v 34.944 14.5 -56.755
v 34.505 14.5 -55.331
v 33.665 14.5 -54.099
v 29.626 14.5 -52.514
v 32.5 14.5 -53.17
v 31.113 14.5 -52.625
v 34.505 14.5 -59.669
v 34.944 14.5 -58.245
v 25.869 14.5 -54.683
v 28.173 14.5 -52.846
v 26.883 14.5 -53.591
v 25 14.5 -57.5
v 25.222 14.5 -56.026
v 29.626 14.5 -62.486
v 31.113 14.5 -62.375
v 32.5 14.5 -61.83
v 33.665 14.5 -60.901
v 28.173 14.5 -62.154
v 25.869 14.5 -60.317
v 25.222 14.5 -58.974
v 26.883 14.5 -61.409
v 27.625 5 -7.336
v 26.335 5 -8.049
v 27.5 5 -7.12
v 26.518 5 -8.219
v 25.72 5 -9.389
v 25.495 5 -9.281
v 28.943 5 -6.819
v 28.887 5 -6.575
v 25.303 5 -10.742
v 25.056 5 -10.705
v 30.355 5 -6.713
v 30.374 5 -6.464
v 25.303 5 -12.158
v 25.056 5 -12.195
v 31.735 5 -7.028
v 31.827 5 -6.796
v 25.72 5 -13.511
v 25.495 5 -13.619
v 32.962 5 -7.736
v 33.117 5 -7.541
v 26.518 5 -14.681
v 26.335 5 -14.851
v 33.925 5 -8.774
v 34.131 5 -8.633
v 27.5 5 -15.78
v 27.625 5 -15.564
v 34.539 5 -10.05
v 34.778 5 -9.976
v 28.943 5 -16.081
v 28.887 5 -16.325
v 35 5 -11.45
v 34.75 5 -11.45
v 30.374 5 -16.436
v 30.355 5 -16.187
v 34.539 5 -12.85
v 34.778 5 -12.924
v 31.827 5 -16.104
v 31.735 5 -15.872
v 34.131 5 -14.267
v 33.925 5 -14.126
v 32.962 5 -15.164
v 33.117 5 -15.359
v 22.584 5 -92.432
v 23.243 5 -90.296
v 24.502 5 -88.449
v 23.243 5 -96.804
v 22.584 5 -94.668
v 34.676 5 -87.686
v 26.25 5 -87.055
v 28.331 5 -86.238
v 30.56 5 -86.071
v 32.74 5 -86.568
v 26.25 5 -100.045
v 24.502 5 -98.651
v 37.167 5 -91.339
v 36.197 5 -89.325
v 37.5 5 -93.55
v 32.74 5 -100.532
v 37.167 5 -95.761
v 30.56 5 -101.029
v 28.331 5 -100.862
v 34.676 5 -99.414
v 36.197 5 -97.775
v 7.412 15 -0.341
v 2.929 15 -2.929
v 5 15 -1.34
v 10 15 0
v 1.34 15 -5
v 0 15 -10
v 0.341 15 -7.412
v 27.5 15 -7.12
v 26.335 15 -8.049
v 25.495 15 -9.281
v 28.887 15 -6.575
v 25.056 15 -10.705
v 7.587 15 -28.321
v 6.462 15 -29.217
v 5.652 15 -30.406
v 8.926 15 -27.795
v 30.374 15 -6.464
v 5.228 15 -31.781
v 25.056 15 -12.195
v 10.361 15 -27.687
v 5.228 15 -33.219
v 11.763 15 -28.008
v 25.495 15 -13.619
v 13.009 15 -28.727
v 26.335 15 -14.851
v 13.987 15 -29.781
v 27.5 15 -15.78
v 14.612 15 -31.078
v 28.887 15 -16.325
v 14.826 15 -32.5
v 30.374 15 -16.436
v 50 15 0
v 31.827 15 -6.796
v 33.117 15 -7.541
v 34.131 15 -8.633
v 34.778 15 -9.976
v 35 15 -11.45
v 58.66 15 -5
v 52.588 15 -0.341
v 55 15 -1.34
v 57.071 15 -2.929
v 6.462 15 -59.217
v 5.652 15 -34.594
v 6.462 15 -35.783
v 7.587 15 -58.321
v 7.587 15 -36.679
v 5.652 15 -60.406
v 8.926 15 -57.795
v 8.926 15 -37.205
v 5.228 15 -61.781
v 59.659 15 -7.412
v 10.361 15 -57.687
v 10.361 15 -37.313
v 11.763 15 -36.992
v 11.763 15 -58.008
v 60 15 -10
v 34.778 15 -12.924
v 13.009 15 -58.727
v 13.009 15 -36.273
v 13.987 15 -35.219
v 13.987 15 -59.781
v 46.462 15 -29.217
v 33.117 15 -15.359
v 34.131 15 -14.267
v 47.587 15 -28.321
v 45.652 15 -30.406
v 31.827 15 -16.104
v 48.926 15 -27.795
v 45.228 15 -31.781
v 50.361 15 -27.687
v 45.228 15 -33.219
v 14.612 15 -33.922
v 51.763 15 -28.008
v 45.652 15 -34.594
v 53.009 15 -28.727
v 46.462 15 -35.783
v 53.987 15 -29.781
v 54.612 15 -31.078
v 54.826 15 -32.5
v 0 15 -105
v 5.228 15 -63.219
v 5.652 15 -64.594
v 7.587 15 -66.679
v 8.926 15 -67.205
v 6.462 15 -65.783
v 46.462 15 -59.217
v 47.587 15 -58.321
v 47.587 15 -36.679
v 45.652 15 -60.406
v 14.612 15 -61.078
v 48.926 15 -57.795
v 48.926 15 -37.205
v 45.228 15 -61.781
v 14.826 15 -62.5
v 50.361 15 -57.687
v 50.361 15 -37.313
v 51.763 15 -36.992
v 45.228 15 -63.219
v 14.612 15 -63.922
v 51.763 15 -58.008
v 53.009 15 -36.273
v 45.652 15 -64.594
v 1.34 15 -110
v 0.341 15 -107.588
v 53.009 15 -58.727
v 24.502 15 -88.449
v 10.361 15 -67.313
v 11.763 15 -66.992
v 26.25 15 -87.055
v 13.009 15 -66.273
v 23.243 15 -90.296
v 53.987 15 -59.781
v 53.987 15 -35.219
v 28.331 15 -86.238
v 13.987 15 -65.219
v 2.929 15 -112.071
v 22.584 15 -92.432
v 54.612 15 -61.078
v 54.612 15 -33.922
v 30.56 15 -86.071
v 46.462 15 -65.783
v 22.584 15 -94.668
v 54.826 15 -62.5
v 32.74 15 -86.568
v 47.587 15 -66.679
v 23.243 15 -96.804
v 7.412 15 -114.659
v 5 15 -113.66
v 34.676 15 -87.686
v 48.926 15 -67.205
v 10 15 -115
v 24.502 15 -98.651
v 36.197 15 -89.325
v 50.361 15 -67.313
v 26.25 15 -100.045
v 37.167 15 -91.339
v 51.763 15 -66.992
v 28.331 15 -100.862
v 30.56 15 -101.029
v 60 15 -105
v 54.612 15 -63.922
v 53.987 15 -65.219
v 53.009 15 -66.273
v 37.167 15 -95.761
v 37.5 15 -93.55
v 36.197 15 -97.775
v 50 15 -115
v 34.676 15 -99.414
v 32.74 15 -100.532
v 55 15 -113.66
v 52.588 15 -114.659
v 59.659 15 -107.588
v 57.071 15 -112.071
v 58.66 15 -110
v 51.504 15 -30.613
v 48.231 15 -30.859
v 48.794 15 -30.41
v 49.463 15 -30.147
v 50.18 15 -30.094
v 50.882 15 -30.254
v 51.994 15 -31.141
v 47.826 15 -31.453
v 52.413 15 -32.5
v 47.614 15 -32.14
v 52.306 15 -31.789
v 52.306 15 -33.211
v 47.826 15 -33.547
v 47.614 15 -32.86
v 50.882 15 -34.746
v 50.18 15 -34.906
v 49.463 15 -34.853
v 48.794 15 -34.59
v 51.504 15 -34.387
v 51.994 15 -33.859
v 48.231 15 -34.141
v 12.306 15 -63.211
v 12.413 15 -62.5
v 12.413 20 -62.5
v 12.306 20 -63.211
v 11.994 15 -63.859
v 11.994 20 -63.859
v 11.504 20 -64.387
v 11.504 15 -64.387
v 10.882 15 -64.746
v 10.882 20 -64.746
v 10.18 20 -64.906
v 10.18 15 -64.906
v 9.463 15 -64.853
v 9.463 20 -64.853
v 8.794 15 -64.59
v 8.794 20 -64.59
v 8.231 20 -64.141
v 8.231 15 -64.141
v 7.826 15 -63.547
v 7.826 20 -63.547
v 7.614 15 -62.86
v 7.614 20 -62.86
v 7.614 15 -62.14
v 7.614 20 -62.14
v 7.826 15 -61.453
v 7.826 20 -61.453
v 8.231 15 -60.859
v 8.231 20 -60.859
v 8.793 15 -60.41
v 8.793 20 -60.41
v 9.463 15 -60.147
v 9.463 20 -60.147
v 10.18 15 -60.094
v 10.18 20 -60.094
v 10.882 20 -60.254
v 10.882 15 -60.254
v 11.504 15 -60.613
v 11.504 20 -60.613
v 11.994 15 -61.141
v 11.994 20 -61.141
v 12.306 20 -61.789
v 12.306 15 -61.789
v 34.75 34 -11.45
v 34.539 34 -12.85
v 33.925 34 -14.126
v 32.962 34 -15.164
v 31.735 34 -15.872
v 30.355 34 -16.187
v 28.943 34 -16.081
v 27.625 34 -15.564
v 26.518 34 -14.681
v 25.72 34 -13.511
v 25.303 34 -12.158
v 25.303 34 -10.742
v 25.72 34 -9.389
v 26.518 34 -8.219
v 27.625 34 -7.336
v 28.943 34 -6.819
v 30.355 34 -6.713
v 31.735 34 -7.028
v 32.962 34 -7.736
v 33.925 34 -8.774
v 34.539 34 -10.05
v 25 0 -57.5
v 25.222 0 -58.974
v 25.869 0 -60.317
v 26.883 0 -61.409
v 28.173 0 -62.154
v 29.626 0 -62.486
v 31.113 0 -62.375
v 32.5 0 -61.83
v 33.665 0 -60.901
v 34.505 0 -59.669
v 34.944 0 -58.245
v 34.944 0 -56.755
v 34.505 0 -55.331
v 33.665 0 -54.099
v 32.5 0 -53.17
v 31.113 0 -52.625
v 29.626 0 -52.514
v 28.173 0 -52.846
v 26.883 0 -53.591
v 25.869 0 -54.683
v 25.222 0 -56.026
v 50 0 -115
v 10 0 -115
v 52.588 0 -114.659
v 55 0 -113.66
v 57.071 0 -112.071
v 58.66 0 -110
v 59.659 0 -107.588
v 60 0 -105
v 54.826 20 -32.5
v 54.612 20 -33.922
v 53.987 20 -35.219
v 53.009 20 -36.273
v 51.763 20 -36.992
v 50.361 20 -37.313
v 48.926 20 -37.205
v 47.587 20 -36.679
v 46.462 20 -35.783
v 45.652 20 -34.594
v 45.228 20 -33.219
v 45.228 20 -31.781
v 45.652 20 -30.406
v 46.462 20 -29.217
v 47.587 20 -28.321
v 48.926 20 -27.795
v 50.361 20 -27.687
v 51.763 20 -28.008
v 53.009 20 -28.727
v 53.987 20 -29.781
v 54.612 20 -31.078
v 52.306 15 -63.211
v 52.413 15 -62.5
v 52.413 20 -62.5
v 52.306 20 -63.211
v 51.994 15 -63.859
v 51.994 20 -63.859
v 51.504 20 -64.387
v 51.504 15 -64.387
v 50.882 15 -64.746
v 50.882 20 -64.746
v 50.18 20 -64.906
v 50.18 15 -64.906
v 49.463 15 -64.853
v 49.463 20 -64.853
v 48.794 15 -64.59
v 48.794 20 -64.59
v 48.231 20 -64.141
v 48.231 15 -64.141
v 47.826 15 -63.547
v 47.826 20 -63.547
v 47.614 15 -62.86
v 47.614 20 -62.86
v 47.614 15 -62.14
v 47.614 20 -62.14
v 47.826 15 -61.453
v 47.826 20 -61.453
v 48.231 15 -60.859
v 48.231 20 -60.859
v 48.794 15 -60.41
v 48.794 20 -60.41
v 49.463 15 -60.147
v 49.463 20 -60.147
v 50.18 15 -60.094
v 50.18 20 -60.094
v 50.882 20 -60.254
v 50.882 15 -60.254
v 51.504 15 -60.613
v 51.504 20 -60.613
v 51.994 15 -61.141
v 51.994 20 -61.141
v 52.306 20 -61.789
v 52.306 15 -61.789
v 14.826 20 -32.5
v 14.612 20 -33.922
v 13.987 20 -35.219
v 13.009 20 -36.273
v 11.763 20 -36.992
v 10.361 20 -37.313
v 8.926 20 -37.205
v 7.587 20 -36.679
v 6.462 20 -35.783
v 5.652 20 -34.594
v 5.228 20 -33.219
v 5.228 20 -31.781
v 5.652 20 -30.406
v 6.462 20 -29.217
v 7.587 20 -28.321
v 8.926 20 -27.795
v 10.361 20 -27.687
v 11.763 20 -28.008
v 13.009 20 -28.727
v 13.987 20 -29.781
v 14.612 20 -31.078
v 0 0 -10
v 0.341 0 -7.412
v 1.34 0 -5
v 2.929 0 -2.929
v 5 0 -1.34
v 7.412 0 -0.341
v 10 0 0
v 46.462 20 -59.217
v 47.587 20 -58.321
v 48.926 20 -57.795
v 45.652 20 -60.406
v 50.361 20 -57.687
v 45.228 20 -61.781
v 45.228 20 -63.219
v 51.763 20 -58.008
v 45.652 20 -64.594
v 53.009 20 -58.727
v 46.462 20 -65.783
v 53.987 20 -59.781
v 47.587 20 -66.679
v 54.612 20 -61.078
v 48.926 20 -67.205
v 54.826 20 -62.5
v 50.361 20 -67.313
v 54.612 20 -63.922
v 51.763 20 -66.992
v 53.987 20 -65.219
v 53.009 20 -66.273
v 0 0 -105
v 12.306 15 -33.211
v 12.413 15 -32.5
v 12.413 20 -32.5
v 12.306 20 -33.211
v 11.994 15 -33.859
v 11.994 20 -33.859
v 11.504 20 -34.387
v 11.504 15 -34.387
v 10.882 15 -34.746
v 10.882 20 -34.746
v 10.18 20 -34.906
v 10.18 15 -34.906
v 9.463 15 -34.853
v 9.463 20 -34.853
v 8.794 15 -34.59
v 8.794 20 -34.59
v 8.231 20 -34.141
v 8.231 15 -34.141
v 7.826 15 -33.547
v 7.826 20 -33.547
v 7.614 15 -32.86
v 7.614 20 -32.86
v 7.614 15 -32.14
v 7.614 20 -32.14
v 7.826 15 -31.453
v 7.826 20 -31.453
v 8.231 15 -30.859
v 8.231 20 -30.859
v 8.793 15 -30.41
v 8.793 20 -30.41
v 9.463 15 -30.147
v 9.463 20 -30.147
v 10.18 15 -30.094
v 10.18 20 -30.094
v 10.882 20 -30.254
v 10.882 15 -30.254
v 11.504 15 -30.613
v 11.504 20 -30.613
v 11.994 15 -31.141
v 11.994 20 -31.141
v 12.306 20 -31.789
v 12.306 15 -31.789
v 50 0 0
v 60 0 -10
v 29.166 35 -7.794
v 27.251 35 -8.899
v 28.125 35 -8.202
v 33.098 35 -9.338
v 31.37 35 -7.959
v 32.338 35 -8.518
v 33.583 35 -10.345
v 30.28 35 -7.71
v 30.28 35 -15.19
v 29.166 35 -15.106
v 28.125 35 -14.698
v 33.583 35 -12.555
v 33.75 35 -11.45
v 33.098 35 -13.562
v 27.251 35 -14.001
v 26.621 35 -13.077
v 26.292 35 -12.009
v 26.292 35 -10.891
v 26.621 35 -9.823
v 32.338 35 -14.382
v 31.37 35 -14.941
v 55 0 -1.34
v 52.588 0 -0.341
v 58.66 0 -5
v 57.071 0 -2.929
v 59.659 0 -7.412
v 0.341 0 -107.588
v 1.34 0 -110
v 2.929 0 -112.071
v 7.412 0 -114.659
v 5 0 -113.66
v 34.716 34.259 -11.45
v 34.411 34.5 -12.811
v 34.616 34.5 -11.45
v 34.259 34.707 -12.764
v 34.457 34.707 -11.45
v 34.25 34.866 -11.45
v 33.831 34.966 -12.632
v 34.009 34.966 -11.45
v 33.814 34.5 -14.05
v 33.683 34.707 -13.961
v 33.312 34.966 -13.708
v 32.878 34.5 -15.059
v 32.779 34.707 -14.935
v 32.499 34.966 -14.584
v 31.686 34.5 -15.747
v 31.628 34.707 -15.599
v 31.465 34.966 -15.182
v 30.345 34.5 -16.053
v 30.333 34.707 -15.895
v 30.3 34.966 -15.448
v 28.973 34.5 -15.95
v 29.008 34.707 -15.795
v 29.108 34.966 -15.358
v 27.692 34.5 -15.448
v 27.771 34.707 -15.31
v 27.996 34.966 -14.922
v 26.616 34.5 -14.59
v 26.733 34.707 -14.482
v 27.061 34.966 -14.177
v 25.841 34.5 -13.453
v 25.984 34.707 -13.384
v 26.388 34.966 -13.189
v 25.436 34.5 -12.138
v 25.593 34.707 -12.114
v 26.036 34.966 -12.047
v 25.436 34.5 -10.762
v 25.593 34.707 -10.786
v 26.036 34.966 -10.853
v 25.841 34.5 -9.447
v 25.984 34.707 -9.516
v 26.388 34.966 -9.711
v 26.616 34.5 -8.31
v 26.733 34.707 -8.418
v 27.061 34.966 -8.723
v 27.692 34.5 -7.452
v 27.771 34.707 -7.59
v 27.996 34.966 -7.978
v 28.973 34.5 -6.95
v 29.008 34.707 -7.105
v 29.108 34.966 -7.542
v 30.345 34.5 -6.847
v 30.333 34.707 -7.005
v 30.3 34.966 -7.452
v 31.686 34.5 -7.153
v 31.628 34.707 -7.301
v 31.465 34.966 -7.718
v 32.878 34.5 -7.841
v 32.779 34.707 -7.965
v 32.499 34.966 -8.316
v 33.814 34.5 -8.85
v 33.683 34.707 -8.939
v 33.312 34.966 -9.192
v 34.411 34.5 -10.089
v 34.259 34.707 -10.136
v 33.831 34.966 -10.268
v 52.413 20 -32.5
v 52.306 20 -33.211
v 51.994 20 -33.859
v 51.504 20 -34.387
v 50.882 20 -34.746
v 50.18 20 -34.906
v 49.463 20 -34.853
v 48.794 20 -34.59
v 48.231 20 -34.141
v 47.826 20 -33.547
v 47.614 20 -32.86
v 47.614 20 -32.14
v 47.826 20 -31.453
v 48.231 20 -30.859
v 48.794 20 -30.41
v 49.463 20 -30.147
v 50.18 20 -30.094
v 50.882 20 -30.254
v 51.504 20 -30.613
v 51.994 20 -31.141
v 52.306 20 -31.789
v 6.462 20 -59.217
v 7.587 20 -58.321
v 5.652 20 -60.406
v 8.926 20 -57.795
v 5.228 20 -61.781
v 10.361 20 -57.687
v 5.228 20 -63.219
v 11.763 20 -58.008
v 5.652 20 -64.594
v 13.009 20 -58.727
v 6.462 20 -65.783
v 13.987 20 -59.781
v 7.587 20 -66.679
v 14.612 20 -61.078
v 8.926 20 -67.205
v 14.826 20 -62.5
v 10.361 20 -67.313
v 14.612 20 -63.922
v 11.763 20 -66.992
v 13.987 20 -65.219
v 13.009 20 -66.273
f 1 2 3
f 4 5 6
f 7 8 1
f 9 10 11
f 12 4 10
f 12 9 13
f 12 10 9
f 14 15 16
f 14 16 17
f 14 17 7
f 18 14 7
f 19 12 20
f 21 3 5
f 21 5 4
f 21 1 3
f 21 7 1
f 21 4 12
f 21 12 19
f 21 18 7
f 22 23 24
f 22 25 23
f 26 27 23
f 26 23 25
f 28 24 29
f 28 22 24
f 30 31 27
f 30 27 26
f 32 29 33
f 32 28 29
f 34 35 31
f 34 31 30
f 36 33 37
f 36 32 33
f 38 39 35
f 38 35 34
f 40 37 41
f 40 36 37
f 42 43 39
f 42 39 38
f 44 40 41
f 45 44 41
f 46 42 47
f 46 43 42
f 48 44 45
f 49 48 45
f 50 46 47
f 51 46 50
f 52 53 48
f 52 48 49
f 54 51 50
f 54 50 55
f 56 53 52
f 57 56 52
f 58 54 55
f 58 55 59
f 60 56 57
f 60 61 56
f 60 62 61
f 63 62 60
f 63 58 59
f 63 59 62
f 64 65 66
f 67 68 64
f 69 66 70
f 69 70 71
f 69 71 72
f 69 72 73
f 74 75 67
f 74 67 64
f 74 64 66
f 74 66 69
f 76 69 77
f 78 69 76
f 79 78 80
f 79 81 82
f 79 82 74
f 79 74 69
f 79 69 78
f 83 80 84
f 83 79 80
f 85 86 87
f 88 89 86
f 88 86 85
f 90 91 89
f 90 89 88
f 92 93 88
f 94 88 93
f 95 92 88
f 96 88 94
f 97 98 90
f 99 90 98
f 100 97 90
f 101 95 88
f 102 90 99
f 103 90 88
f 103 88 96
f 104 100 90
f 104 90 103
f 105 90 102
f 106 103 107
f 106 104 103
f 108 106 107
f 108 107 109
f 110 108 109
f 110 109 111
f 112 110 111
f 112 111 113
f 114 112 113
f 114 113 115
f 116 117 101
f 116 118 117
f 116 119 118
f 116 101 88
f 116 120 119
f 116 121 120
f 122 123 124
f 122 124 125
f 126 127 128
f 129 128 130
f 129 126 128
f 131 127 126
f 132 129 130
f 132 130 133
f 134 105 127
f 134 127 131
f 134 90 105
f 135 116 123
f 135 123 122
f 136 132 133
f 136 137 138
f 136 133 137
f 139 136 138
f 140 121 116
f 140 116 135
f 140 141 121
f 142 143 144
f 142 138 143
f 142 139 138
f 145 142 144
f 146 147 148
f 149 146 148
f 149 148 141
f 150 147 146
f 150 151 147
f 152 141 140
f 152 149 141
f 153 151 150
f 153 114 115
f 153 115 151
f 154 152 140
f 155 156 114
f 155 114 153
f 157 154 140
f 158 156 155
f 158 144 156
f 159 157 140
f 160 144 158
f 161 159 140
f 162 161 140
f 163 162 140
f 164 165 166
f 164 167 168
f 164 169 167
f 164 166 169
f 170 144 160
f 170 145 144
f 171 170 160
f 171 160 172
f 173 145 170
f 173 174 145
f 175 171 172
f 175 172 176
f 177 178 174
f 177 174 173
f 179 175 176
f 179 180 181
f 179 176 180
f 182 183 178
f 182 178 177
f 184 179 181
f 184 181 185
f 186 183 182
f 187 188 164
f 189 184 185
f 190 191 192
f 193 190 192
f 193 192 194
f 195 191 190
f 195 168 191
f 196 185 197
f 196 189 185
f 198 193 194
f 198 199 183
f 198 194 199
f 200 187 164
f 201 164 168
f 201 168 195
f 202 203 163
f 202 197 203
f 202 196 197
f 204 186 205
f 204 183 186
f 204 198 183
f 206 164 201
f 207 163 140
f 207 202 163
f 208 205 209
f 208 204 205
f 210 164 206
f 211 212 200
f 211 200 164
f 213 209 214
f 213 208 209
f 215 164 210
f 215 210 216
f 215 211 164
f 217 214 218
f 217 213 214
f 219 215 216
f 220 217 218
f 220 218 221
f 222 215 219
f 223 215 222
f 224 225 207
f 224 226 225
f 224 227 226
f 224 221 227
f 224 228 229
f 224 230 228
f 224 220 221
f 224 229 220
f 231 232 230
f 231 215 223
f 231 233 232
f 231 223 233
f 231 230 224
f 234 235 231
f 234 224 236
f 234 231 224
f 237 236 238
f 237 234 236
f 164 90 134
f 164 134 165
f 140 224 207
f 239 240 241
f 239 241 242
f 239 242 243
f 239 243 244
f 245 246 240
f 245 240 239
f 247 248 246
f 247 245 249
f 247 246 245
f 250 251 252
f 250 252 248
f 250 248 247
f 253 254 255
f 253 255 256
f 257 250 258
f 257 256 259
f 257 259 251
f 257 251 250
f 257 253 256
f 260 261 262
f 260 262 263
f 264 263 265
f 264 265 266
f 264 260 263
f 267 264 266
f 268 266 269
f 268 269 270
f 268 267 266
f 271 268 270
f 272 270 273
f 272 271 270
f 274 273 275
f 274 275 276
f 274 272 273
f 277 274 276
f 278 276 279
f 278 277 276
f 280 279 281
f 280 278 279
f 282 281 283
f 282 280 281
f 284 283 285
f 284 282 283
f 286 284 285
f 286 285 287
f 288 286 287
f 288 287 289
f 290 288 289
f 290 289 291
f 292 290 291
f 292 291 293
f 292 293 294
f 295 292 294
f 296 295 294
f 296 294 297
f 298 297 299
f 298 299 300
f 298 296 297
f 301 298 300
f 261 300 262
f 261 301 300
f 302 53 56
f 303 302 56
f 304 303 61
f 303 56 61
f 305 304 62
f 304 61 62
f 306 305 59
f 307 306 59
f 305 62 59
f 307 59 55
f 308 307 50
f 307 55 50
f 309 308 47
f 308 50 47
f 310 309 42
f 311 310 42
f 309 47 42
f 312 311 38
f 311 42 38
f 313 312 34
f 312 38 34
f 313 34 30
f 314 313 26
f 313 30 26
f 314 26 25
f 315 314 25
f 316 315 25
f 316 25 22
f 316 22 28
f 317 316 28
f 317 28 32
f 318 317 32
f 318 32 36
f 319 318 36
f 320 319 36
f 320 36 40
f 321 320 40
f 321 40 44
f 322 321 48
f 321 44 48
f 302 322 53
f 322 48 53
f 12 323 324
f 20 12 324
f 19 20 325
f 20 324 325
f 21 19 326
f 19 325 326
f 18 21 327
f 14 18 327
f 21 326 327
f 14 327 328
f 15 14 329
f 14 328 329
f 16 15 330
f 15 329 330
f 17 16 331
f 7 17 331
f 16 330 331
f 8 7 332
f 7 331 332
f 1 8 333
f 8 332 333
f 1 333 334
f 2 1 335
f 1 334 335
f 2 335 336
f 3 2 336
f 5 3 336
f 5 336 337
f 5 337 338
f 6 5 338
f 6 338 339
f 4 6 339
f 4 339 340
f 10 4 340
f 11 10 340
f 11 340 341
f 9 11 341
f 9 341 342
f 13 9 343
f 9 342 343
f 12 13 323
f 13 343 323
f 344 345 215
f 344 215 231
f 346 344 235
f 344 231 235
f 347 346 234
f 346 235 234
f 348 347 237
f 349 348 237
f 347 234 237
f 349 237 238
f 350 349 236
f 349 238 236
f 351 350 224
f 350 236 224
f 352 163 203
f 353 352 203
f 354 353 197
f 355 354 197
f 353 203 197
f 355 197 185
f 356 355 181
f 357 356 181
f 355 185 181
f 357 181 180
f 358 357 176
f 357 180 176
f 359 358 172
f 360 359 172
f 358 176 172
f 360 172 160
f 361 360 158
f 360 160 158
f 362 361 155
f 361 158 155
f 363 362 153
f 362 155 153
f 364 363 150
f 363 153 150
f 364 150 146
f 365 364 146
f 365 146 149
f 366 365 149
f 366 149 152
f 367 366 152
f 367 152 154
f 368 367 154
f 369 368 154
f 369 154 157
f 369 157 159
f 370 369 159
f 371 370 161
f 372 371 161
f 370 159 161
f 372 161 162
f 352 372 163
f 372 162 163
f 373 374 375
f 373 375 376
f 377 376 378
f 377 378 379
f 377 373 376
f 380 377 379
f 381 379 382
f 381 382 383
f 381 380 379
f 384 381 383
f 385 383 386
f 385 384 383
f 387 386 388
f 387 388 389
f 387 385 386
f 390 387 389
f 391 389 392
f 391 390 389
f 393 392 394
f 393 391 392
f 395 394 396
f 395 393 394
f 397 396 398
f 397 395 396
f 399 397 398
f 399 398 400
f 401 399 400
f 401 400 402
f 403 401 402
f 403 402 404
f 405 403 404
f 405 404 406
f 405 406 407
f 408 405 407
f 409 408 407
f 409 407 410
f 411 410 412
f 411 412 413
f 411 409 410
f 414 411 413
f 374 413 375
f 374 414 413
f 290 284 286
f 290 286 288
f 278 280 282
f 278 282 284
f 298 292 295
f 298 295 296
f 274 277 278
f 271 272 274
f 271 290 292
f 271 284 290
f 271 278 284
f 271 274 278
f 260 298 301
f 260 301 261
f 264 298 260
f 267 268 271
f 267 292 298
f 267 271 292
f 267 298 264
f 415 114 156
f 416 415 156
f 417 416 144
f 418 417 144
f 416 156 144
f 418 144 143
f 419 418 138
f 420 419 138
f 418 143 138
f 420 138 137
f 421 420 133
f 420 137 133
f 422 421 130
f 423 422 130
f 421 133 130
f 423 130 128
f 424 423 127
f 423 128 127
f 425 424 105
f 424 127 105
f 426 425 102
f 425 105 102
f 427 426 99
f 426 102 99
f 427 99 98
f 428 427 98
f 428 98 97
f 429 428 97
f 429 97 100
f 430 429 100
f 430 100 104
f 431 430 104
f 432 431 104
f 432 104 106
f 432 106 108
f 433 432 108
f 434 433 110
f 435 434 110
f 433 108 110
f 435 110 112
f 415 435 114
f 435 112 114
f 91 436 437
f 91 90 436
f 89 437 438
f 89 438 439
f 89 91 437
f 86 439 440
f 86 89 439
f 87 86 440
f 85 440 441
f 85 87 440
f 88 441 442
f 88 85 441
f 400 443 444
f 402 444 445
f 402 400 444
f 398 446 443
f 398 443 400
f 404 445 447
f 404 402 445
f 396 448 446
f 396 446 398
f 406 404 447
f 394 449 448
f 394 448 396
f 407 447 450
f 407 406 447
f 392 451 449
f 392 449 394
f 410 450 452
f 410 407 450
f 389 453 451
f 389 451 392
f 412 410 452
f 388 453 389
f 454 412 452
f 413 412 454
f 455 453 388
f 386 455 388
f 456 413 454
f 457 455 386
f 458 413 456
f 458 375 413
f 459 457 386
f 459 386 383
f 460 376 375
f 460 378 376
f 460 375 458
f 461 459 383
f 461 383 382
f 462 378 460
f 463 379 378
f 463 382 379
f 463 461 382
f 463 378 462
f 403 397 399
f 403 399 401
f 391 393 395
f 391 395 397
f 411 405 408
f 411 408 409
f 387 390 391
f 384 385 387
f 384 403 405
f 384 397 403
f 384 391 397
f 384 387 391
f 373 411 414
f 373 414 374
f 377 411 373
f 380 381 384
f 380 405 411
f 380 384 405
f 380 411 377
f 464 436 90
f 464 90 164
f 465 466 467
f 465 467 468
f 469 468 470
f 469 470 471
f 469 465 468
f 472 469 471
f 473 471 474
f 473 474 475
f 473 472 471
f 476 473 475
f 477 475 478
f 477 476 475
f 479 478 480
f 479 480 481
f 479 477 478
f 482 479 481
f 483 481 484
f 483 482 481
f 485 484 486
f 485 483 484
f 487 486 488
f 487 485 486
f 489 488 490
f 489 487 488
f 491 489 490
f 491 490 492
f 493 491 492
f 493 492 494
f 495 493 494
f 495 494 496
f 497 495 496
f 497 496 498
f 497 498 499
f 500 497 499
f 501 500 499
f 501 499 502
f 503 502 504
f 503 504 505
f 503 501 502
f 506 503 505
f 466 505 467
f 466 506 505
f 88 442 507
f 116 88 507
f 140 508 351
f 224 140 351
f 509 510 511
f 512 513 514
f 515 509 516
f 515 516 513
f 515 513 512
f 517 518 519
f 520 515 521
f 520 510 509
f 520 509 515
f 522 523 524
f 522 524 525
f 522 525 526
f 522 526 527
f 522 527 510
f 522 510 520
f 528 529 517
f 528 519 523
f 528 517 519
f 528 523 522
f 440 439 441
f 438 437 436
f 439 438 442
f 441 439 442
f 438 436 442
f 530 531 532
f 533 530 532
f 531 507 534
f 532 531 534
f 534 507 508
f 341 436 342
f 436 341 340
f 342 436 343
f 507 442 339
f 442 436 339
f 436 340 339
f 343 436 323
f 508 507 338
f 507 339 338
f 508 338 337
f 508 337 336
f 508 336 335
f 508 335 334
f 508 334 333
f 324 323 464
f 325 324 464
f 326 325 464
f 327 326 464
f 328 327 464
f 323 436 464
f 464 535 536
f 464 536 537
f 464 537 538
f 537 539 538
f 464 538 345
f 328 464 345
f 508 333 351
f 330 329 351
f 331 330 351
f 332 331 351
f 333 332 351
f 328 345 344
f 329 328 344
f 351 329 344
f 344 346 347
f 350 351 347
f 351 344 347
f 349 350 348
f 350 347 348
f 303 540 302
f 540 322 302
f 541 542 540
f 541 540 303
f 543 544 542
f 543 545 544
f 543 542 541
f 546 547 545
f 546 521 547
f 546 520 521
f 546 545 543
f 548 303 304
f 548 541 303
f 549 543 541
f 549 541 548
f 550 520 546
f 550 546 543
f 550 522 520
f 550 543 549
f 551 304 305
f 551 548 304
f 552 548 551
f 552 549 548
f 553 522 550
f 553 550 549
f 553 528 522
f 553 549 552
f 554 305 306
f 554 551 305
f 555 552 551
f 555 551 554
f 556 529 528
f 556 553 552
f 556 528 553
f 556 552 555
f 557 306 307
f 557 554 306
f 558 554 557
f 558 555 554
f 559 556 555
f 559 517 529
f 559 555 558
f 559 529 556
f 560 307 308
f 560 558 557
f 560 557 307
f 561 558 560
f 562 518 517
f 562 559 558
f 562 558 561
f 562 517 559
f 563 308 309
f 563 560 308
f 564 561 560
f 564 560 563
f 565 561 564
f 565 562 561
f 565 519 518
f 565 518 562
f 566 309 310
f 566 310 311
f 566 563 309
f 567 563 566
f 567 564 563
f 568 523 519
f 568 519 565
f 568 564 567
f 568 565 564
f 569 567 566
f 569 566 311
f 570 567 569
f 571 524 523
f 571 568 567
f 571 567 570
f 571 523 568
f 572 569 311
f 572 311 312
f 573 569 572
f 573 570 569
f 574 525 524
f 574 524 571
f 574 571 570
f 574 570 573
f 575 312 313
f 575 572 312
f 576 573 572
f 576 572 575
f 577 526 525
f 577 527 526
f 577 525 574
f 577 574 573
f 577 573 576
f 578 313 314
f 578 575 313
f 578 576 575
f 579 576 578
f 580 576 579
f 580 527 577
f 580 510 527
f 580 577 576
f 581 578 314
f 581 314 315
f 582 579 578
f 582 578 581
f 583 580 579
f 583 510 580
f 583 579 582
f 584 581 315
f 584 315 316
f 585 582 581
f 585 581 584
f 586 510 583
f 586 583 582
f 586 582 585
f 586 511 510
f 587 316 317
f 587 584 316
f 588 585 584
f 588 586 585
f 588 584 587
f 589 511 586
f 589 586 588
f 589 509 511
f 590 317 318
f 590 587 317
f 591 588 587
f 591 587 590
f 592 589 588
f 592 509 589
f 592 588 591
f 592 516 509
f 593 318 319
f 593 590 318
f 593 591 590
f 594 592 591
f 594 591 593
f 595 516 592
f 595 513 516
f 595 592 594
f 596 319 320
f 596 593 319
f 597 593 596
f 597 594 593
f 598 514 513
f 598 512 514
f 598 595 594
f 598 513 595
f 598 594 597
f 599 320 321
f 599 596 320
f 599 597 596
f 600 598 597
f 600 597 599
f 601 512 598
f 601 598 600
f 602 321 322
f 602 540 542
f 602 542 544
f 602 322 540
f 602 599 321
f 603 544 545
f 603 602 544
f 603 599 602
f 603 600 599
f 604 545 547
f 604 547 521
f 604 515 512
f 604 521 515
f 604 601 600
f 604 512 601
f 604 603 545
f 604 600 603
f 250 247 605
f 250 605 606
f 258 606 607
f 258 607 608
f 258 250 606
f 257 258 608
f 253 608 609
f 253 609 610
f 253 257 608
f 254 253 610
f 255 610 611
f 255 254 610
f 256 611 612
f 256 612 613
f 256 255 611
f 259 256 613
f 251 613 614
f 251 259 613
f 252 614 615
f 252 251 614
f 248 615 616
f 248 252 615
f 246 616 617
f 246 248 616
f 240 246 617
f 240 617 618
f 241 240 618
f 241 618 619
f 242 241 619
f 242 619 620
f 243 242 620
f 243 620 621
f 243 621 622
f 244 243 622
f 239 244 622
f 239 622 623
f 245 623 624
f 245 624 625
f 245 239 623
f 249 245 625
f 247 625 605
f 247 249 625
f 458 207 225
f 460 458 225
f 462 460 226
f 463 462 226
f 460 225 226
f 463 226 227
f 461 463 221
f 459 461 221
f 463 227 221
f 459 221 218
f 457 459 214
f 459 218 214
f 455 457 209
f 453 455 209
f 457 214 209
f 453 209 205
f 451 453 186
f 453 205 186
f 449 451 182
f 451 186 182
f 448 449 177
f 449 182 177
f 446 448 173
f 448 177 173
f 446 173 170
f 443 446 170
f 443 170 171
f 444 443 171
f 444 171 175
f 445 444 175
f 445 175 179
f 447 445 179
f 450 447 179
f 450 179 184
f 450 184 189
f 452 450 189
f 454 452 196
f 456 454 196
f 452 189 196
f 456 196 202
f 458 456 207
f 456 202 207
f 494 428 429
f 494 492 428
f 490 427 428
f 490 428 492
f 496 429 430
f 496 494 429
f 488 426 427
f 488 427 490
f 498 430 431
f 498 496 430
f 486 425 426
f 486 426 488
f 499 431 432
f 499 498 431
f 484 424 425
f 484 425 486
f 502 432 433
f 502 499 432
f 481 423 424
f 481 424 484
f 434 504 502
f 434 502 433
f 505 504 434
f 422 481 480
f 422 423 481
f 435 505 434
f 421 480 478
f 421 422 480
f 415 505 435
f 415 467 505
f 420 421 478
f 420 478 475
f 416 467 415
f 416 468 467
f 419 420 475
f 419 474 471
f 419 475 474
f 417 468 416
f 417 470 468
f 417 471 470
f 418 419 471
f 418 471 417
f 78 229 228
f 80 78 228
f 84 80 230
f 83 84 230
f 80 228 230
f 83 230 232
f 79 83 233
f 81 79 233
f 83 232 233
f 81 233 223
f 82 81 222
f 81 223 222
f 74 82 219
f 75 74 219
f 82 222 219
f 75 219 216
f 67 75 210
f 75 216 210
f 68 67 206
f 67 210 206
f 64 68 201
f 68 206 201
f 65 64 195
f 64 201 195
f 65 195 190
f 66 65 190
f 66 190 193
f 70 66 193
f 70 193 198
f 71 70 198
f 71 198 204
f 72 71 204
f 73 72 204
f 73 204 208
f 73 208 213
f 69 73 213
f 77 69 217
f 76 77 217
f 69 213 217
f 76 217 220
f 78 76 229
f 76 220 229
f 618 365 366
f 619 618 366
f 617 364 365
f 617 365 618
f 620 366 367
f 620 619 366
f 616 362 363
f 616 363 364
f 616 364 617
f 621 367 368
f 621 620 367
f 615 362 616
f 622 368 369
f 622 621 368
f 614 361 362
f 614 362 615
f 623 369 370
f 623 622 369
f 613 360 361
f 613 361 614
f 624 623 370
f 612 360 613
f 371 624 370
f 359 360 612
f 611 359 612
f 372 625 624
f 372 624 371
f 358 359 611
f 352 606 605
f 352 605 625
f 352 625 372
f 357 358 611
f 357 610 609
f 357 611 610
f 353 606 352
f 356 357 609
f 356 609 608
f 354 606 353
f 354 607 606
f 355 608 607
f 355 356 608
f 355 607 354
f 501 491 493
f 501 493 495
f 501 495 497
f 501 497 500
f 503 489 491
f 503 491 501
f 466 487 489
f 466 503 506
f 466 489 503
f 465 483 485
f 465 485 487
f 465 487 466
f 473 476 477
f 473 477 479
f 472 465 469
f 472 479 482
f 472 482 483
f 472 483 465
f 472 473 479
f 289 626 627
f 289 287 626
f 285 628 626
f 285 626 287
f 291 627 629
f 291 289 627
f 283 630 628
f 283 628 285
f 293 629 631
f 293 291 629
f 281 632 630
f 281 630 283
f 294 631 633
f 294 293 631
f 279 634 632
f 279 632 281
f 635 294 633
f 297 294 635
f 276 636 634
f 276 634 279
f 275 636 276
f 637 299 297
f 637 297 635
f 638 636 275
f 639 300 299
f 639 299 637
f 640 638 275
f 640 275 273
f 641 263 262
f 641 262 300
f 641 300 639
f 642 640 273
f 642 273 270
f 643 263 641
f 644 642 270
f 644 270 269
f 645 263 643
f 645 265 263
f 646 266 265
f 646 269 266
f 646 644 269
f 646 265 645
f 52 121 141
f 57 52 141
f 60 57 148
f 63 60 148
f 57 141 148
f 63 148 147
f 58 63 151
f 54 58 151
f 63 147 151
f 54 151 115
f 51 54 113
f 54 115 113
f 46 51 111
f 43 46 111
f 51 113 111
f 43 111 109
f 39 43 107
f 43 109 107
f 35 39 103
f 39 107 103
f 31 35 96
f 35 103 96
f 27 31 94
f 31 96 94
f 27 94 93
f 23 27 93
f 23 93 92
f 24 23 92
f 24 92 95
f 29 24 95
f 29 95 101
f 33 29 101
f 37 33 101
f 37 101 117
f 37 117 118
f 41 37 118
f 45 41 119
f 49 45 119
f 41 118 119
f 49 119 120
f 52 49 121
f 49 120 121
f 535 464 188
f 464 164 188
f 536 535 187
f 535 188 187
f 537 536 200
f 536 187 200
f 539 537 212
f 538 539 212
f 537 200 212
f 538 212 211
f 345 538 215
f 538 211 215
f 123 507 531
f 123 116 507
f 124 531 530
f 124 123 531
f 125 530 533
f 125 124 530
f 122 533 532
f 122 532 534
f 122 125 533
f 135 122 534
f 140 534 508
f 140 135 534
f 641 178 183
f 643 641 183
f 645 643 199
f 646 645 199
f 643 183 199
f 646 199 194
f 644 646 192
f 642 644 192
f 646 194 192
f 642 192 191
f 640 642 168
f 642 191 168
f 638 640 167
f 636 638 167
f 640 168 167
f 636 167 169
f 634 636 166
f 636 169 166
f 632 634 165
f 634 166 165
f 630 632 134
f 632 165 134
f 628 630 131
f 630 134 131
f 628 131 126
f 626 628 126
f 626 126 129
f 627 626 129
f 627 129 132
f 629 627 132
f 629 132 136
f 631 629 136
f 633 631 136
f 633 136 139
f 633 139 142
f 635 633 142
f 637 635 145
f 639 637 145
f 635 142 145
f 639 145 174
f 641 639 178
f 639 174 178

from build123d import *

# Parameters (mm, degrees)
SKETCH1_W           = 60
SKETCH1_H           = 115
BOSS_EXTRUDE1_DEPTH = 15
SKETCH2_R           = 7.5
SKETCH2_R_2         = 5
CUT_EXTRUDE1_DEPTH  = 10
SKETCH3_R           = 5
CUT_EXTRUDE2_DEPTH  = 14.5
SKETCH4_R           = 4.75
BOSS_EXTRUDE2_DEPTH = 30
FILLET1_R           = 1
FILLET2_R           = 10
SKETCH5_R           = 4.826
SKETCH5_R_2         = 2.413
BOSS_EXTRUDE3_DEPTH = 5


with BuildPart() as part:
    # Sketch1 → Boss-Extrude1 (new body)
    with BuildSketch(Plane(origin=(0, 0, 0), x_dir=(1, 0, 0), z_dir=(0, 1, 0))):
        with Locations((30, 57.5)):
            Rectangle(SKETCH1_W, SKETCH1_H)
    extrude(amount=BOSS_EXTRUDE1_DEPTH)

    # Sketch2 → Cut-Extrude1 (cut)
    with BuildSketch(Plane(origin=(0, 15, 0), x_dir=(1, 0, 0), z_dir=(0, 1, 0))):
        with Locations((30, 93.55)):
            Circle(SKETCH2_R)
        with Locations((30, 11.45)):
            Circle(SKETCH2_R_2)
    extrude(amount=-CUT_EXTRUDE1_DEPTH, mode=Mode.SUBTRACT)

    # Sketch3 → Cut-Extrude2 (cut)
    with BuildSketch(Plane(origin=(0, 0, 0), x_dir=(-1, 0, 0), z_dir=(0, -1, 0))):
        with Locations((-30, 57.5)):
            Circle(SKETCH3_R)
    extrude(amount=-CUT_EXTRUDE2_DEPTH, mode=Mode.SUBTRACT)

    # Sketch4 → Boss-Extrude2 (add)
    with BuildSketch(Plane(origin=(0, 5, 0), x_dir=(1, 0, 0), z_dir=(0, 1, 0))):
        with Locations((30, 11.45)):
            Circle(SKETCH4_R)
    extrude(amount=BOSS_EXTRUDE2_DEPTH)

    # Fillet1
    fillet1_edges = [part.edges().sort_by_distance(p)[0] for p in [
        (25.25, 35, -11.45),
    ]]
    fillet(fillet1_edges, radius=FILLET1_R)

    # Fillet2
    fillet2_edges = [part.edges().sort_by_distance(p)[0] for p in [
        (0, 7.5, -115),
        (60, 7.5, -115),
        (60, 7.5, 0),
        (0, 7.5, 0),
    ]]
    fillet(fillet2_edges, radius=FILLET2_R)

    # Sketch5 → Boss-Extrude3 (add)
    with BuildSketch(Plane(origin=(0, 15, 0), x_dir=(1, 0, 0), z_dir=(0, 1, 0))):
        with Locations((50, 62.5)):
            Circle(SKETCH5_R)
        with Locations((50, 62.5)):
            Circle(SKETCH5_R_2, mode=Mode.SUBTRACT)
        with Locations((50, 32.5)):
            Circle(SKETCH5_R)
        with Locations((50, 32.5)):
            Circle(SKETCH5_R_2, mode=Mode.SUBTRACT)
        with Locations((10, 32.5)):
            Circle(SKETCH5_R)
        with Locations((10, 32.5)):
            Circle(SKETCH5_R_2, mode=Mode.SUBTRACT)
        with Locations((10, 62.5)):
            Circle(SKETCH5_R)
        with Locations((10, 62.5)):
            Circle(SKETCH5_R_2, mode=Mode.SUBTRACT)
    extrude(amount=BOSS_EXTRUDE3_DEPTH)


solid = part.part
